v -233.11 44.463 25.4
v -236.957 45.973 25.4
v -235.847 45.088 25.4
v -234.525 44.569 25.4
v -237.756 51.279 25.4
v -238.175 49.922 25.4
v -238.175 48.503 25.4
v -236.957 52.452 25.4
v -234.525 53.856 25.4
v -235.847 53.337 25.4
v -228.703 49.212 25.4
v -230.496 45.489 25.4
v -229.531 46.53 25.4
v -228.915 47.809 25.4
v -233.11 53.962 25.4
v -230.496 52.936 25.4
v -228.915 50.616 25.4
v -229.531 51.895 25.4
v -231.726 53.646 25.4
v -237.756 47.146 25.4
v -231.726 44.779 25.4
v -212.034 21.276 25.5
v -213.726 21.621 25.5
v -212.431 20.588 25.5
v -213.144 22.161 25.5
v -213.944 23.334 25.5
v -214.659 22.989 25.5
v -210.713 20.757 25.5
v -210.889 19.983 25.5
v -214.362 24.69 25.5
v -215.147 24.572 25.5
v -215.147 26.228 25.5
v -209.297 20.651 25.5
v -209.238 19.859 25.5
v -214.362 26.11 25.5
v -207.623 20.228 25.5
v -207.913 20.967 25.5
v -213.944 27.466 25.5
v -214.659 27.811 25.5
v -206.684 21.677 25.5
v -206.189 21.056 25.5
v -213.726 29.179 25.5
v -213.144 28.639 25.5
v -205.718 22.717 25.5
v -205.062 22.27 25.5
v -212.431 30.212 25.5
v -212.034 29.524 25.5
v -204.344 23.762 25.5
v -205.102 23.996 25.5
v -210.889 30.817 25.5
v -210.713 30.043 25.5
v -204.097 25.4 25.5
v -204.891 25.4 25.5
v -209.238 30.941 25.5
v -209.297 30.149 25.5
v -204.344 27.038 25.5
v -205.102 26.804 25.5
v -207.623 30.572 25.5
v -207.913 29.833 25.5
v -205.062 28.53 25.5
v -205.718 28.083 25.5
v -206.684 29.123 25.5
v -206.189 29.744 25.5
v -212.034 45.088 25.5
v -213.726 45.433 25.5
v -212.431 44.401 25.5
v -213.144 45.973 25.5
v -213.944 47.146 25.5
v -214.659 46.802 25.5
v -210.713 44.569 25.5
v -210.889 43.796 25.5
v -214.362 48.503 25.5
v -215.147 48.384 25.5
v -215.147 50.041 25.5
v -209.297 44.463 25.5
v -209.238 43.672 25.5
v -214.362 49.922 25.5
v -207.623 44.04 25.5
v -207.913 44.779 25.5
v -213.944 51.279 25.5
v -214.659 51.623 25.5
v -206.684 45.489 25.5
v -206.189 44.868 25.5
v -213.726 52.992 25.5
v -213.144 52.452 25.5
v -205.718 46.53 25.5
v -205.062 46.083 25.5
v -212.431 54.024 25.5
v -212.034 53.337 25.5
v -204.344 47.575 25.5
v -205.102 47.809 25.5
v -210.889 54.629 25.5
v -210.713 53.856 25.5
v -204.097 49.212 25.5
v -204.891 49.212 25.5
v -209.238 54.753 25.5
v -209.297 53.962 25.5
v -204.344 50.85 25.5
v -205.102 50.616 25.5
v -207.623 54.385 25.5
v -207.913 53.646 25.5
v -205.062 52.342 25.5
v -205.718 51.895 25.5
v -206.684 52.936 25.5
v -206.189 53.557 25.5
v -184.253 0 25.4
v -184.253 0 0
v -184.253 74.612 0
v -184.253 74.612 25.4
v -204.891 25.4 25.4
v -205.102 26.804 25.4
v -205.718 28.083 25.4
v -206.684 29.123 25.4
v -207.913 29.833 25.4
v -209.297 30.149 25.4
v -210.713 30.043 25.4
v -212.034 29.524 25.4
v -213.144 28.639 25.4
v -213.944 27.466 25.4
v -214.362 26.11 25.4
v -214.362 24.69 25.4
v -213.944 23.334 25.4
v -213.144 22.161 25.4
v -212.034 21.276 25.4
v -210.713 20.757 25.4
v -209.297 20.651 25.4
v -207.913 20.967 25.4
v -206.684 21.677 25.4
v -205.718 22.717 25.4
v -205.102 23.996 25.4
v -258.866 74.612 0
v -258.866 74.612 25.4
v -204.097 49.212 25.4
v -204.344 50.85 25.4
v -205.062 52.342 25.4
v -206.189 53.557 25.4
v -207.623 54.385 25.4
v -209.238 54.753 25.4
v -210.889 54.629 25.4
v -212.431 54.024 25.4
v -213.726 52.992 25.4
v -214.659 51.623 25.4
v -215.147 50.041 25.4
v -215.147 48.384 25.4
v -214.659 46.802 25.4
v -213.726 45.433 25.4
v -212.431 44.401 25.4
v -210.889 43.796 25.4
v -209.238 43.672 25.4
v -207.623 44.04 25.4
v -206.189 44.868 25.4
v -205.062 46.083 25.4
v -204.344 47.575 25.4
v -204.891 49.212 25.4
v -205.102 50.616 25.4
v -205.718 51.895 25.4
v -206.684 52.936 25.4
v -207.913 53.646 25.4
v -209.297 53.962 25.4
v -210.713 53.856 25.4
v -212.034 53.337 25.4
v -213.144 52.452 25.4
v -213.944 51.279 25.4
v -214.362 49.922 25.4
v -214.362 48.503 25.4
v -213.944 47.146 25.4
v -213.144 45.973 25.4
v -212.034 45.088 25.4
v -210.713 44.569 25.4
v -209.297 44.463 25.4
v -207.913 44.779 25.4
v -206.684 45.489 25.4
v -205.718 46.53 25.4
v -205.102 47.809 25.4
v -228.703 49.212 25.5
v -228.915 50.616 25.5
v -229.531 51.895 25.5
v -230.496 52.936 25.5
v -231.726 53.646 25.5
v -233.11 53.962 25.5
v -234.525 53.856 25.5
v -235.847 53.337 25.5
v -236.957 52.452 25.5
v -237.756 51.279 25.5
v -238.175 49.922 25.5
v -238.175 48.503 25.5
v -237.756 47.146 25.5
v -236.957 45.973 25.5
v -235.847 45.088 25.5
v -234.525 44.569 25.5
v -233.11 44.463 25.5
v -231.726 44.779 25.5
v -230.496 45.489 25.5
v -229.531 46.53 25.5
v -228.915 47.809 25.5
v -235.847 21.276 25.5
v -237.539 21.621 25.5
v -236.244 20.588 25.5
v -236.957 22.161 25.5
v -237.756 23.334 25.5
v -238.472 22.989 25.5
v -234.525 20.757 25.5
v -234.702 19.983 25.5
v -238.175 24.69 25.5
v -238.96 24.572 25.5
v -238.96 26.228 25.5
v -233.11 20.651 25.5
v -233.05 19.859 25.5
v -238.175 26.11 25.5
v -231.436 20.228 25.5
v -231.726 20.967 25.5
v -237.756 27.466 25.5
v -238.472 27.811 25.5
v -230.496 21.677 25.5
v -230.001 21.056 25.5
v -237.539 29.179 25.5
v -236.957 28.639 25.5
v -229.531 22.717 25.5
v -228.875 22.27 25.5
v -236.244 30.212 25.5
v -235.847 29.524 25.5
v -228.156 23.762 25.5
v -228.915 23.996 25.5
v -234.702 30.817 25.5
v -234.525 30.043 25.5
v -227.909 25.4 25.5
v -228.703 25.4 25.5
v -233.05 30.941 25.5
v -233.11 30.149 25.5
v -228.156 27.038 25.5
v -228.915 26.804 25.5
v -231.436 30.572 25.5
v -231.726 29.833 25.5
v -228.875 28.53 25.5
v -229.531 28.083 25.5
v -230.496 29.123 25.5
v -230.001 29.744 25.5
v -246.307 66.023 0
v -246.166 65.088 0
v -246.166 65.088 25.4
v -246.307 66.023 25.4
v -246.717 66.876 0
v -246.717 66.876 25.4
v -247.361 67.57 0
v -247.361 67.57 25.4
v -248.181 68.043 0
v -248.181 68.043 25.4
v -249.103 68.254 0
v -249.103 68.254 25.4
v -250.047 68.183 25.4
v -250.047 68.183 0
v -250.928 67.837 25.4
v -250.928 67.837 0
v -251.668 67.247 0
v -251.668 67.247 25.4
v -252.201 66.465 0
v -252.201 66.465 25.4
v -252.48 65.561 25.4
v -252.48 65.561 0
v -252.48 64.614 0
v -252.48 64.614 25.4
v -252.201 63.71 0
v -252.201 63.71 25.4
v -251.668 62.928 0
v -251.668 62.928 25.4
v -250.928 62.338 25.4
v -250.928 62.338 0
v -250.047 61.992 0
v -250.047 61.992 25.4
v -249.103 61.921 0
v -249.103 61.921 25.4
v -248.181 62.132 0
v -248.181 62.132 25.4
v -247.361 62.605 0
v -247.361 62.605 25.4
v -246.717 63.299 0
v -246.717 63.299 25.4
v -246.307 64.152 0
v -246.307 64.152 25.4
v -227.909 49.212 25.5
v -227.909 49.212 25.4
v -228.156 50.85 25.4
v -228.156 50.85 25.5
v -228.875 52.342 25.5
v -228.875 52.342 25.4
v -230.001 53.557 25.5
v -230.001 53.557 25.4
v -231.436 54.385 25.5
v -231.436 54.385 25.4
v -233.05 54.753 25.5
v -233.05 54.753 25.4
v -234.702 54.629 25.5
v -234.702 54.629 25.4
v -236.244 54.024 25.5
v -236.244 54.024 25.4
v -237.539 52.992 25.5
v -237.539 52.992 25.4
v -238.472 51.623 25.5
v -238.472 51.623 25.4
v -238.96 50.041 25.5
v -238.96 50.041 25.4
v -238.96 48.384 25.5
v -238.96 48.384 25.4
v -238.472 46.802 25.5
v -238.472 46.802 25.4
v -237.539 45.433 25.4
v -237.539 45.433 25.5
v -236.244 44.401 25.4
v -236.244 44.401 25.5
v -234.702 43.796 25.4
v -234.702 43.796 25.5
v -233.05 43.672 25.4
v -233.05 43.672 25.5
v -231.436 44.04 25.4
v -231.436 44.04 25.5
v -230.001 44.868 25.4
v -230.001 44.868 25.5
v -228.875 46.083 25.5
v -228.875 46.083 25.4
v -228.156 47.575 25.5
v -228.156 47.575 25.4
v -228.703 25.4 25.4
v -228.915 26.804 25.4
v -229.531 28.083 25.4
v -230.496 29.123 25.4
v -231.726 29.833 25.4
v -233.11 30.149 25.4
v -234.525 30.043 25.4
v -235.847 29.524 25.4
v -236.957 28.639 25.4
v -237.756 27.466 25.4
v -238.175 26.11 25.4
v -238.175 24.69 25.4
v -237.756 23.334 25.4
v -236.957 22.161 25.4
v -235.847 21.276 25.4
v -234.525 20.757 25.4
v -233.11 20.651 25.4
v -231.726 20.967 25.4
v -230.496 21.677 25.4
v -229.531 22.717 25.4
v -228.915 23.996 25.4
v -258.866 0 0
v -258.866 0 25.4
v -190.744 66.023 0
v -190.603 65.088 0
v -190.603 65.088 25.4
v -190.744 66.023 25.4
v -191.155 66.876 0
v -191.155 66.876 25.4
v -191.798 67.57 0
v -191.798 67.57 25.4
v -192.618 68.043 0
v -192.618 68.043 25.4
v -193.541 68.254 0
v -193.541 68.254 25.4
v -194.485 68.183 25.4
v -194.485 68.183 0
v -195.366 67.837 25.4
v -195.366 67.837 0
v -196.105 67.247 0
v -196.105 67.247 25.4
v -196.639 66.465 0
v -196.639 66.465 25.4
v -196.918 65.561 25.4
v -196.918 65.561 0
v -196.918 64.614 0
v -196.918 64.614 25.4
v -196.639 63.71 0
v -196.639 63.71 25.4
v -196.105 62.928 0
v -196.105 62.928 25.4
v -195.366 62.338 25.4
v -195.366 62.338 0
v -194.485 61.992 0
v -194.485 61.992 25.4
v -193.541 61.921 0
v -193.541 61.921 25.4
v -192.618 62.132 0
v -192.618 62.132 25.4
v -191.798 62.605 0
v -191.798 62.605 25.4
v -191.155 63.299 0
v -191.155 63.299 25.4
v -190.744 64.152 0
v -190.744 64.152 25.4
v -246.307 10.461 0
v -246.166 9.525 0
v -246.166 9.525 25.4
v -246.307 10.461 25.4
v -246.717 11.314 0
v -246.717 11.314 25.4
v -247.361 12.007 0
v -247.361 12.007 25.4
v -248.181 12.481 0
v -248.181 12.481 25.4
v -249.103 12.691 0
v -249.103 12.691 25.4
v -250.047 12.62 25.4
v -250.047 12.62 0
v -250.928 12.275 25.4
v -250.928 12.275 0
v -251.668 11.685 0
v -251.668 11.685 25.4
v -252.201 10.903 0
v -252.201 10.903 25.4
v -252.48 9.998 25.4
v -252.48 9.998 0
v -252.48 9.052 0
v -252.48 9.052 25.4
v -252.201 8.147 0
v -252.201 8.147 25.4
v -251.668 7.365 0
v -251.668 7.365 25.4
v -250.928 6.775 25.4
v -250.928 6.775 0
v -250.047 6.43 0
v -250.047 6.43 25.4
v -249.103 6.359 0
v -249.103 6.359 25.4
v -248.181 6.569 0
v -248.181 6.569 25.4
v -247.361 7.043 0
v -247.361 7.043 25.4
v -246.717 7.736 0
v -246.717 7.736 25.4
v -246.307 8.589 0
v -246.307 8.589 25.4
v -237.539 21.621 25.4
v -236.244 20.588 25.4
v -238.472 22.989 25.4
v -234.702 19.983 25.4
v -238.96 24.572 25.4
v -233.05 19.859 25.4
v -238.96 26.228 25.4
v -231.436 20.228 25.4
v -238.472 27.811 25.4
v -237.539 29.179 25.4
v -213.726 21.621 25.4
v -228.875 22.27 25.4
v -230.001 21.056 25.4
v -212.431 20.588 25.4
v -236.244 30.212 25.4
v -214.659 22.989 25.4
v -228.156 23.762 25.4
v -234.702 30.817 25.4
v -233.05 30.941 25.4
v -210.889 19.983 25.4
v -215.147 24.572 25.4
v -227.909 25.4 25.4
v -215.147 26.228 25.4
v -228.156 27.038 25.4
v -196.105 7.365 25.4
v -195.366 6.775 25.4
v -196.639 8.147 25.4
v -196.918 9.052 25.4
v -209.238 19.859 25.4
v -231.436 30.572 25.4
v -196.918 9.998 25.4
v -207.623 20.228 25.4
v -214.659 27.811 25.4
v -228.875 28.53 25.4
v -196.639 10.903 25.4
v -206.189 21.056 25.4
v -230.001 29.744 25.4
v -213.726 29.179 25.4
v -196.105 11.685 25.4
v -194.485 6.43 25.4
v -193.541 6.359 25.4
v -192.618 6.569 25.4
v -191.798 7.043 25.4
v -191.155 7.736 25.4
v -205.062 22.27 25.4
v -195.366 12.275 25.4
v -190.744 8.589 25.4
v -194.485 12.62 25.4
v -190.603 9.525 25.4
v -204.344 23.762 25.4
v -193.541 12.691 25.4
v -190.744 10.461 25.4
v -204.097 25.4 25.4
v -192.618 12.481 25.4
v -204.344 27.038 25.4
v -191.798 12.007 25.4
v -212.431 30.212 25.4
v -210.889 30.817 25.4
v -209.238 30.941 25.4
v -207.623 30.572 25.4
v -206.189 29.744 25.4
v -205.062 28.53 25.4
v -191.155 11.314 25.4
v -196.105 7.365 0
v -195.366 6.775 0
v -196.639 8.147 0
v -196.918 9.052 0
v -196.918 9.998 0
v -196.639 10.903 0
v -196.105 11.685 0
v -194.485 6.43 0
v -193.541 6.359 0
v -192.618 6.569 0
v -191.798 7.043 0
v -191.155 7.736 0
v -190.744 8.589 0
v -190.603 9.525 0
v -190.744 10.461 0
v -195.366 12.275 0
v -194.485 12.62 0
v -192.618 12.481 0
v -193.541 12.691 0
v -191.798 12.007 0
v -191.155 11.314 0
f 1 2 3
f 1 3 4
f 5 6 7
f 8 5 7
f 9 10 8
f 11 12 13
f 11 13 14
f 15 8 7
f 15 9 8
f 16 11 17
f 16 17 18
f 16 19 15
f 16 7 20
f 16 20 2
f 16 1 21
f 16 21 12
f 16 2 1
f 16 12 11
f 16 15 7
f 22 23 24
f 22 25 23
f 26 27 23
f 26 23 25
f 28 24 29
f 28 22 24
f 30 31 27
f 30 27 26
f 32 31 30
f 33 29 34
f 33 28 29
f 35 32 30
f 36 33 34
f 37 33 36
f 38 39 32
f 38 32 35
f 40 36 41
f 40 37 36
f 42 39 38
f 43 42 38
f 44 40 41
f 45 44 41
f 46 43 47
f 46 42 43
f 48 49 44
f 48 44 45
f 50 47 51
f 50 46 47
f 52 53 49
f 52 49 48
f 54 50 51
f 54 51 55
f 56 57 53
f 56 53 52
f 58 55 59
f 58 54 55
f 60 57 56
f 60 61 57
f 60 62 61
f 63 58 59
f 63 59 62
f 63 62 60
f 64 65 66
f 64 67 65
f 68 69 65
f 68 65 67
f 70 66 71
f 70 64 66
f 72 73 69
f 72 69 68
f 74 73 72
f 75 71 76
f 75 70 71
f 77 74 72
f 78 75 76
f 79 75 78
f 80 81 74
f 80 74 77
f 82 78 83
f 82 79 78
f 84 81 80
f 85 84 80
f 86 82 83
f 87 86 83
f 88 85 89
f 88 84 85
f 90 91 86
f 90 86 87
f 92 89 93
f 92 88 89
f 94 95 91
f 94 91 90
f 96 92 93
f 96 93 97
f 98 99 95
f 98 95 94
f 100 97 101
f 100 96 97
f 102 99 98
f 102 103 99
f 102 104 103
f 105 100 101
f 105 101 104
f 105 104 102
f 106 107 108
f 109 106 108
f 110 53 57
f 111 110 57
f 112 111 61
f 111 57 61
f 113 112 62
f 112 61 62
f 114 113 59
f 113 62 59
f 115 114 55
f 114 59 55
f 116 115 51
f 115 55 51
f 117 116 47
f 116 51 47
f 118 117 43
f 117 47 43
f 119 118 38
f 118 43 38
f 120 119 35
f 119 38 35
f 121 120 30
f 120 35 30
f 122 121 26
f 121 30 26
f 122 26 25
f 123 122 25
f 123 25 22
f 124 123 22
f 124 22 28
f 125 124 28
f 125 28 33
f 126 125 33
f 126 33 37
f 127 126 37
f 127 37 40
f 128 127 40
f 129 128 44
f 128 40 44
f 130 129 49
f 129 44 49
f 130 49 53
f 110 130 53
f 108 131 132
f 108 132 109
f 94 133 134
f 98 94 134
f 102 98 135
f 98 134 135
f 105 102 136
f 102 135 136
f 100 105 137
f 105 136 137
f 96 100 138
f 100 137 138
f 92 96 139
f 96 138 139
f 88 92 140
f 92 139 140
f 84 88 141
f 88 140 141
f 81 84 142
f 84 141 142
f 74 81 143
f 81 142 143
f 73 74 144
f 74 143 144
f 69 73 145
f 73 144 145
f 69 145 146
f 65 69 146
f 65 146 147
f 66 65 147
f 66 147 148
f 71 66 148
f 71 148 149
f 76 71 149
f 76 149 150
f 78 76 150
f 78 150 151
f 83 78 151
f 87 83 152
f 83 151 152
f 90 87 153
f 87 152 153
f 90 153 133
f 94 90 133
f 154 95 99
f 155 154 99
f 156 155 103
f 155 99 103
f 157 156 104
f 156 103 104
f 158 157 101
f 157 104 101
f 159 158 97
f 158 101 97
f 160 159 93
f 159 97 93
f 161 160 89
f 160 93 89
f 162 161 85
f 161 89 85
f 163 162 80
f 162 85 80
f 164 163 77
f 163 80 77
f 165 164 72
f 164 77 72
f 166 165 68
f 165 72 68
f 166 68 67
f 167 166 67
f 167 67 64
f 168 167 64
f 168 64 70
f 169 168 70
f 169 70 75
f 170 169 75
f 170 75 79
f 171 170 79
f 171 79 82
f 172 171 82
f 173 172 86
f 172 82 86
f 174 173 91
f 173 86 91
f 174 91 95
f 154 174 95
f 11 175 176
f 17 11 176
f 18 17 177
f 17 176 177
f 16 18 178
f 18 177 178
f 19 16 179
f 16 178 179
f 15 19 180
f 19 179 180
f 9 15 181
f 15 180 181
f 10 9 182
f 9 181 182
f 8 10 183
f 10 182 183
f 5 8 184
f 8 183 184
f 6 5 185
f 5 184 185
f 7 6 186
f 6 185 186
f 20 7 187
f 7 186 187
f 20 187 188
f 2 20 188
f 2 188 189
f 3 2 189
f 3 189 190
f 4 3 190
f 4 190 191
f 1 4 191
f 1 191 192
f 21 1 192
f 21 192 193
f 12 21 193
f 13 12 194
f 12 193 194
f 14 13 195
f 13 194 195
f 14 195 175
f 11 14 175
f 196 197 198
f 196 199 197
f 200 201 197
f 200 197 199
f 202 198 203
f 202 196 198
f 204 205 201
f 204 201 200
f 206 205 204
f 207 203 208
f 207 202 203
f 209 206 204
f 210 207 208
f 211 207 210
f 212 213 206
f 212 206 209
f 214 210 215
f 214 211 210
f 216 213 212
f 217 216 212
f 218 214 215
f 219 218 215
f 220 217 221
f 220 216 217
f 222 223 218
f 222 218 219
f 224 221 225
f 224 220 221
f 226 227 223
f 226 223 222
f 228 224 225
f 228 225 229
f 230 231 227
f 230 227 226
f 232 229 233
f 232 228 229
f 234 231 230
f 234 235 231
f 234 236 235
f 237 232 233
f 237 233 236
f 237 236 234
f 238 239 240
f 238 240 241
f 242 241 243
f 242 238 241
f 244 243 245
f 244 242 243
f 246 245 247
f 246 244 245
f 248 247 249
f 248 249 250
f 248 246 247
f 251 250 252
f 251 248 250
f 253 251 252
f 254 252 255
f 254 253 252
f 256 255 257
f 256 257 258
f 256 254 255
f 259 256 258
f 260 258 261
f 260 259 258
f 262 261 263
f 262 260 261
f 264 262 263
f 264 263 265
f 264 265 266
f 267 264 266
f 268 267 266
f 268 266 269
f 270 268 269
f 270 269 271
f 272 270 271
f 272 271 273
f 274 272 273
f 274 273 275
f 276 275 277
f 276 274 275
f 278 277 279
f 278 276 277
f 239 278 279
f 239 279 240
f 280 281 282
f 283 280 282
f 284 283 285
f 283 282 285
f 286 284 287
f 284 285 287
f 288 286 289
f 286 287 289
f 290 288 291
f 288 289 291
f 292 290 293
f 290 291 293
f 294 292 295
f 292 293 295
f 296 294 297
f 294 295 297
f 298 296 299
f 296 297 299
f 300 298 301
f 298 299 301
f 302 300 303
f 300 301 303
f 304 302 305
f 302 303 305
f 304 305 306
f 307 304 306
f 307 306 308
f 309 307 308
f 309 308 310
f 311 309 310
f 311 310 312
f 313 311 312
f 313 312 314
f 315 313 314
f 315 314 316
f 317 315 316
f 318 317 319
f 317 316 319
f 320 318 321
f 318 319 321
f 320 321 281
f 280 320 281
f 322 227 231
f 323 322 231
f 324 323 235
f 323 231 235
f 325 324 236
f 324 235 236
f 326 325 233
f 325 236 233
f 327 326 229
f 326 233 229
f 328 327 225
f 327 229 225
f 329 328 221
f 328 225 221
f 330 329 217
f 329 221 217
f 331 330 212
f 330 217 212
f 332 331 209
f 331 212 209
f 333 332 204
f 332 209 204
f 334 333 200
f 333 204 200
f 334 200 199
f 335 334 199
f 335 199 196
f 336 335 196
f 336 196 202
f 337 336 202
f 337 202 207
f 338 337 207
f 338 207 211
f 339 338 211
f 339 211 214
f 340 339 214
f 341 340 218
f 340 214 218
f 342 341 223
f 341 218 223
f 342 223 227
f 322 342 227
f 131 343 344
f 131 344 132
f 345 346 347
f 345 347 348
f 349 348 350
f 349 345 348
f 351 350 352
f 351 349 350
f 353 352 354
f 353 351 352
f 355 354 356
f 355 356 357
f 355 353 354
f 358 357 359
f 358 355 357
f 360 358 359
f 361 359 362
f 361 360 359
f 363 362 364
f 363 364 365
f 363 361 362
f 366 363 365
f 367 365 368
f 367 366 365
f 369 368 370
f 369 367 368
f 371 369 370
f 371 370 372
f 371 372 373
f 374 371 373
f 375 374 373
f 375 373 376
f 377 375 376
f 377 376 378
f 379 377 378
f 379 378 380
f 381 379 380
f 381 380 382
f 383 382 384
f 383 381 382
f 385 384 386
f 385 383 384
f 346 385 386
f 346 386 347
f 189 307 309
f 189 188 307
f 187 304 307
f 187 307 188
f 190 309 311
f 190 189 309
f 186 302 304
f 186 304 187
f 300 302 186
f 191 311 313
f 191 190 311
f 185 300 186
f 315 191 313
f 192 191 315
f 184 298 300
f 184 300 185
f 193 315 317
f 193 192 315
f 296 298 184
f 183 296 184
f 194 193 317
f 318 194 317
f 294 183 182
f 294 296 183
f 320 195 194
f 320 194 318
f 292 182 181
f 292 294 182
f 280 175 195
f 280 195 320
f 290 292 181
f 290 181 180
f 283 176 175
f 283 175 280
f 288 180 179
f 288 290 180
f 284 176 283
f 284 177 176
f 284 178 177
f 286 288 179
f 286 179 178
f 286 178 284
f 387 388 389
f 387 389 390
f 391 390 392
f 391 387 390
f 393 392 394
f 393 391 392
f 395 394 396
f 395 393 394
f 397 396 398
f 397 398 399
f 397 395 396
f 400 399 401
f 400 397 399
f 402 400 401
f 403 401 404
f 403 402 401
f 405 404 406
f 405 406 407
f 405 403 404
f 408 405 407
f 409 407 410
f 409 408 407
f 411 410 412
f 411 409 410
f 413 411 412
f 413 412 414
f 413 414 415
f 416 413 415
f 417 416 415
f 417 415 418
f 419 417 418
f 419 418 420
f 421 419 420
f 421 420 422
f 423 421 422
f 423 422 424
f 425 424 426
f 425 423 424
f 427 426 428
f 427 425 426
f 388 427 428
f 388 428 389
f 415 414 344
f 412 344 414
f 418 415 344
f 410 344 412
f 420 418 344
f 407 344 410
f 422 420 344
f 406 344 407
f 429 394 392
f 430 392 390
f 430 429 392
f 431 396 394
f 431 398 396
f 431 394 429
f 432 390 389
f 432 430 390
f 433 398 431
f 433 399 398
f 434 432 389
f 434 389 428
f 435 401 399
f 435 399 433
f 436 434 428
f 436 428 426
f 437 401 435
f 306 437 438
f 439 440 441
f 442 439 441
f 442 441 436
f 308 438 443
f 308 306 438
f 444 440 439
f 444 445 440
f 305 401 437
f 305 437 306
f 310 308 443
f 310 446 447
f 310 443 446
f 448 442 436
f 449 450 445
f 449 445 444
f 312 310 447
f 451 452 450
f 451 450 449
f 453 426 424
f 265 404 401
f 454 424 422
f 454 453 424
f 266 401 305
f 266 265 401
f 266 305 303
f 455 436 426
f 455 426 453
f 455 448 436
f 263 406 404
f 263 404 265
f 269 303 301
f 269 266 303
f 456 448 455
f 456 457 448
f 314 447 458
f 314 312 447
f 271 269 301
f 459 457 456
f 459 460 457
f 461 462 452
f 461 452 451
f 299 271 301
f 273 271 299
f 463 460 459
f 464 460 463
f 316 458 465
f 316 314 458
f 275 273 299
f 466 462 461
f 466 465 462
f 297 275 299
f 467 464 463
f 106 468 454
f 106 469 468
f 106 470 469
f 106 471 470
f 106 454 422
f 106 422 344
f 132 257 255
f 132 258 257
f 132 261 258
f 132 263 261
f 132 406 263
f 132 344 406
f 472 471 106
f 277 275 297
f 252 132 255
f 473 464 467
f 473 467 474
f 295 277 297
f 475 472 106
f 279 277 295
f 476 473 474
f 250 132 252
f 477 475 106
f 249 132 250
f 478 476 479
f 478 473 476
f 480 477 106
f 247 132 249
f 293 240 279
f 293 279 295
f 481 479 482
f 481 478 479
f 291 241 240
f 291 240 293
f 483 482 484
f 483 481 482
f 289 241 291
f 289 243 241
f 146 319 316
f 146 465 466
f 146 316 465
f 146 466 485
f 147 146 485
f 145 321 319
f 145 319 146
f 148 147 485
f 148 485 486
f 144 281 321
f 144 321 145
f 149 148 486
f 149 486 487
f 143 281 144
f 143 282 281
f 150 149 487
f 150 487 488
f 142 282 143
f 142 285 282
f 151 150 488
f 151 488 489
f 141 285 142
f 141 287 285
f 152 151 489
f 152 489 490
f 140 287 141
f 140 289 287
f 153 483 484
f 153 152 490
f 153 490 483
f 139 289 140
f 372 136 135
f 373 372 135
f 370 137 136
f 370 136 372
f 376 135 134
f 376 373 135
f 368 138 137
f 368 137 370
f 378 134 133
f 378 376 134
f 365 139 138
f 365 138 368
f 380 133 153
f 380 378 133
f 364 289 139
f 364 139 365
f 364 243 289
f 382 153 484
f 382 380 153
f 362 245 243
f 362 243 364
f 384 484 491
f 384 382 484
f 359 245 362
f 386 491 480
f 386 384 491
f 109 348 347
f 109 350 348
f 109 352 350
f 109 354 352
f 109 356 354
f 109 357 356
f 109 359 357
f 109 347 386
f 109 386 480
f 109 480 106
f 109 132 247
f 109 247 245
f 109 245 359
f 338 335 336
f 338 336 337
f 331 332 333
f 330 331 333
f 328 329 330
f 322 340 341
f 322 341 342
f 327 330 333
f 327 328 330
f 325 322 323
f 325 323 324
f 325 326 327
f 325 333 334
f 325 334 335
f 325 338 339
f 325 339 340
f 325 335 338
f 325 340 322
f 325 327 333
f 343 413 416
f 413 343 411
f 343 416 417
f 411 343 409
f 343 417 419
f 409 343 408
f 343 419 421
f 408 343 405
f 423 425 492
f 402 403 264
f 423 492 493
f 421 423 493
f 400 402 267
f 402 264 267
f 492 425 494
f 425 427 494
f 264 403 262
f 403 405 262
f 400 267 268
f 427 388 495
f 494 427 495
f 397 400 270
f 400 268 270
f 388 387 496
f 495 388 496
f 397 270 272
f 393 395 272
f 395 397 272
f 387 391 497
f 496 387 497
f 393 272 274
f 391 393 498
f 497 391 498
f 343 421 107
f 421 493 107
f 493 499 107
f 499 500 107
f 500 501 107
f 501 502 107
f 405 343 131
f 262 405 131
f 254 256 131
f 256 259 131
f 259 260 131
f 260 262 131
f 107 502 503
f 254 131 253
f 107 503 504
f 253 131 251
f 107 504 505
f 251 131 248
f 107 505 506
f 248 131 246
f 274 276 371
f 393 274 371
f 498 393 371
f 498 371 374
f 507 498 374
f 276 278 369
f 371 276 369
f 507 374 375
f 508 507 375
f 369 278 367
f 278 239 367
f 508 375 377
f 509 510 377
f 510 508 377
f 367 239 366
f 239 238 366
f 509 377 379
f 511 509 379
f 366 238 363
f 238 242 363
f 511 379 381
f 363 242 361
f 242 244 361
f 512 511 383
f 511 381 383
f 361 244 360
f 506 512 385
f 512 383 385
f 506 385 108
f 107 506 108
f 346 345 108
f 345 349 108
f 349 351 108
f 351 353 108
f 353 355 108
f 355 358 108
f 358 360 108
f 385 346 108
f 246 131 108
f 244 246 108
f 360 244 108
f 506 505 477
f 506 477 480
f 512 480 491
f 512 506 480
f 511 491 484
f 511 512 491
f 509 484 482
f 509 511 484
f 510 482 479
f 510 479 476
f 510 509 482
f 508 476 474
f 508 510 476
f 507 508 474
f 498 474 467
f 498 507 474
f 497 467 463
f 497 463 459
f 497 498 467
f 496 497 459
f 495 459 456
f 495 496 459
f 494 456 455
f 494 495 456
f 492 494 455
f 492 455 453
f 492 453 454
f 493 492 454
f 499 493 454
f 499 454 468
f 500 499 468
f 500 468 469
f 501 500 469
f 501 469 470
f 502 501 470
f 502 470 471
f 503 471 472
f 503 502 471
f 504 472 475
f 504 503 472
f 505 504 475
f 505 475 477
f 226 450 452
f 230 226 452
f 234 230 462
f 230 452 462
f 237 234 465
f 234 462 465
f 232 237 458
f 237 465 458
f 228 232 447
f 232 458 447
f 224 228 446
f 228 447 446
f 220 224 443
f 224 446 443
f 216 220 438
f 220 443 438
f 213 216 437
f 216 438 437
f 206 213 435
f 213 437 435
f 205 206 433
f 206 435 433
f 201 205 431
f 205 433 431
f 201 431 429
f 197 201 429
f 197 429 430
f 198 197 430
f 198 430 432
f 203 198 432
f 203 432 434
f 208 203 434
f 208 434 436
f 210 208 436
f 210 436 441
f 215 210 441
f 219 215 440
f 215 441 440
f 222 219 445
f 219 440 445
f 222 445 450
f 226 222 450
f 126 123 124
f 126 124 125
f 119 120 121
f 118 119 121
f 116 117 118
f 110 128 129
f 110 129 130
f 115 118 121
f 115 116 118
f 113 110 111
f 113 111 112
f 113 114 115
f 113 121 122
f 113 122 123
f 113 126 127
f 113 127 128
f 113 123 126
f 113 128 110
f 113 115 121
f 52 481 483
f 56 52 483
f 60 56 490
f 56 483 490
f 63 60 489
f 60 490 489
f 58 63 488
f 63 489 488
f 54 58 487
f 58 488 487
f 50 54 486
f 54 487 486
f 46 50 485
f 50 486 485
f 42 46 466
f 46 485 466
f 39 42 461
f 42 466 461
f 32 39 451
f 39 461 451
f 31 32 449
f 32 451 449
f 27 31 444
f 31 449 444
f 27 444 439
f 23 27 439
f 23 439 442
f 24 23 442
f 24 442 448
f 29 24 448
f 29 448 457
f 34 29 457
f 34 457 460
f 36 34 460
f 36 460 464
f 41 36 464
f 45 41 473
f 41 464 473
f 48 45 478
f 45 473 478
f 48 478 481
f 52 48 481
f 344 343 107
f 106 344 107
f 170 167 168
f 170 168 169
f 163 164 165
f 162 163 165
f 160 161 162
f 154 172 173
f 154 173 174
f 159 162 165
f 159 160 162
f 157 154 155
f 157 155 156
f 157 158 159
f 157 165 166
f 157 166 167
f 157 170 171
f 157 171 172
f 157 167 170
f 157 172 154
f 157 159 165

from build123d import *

# Parameters (mm, degrees)
F0_W     = 74.6125
F0_H     = 74.6125
F1_DEPTH = 25.4
F2_R     = 3.175
F3_DEPTH = 25.4
F4_R     = 5.55625
F5_DEPTH = 0.1
F6_R     = 4.7625
F7_DEPTH = 0.1


with BuildPart() as f1:
    # F0 (on Top) → F1 (new body)
    with BuildSketch(Plane.XY):
        with Locations((-221.559285, 37.30625)):
            Rectangle(F0_W, F0_H)
    extrude(amount=F1_DEPTH)

    # F2 (on Top) → F3 (cut)
    with BuildSketch(Plane.XY):
        with Locations((-249.340535, 65.0875)):
            Circle(F2_R)
        with Locations((-193.778035, 65.0875)):
            Circle(F2_R)
        with Locations((-249.340535, 9.525)):
            Circle(F2_R)
        with Locations((-193.778035, 9.525)):
            Circle(F2_R)
    extrude(amount=F3_DEPTH, mode=Mode.SUBTRACT)

    # F4 (on face) → F5 (join)
    with BuildSketch(Plane.XY.offset(25.4)):
        with Locations((-233.465535, 49.2125)):
            Circle(F4_R)
        with Locations((-209.653035, 49.2125)):
            Circle(F4_R)
        with Locations((-233.465535, 25.4)):
            Circle(F4_R)
        with Locations((-209.653035, 25.4)):
            Circle(F4_R)
    extrude(amount=F5_DEPTH)

    # F6 (on face) → F7 (cut)
    with BuildSketch(Plane.XY.offset(25.5)):
        with Locations((-233.465535, 25.4)):
            Circle(F6_R)
        with Locations((-233.465535, 49.2125)):
            Circle(F6_R)
        with Locations((-209.653035, 25.4)):
            Circle(F6_R)
        with Locations((-209.653035, 49.2125)):
            Circle(F6_R)
    extrude(amount=-F7_DEPTH, mode=Mode.SUBTRACT)


solid = f1.part
